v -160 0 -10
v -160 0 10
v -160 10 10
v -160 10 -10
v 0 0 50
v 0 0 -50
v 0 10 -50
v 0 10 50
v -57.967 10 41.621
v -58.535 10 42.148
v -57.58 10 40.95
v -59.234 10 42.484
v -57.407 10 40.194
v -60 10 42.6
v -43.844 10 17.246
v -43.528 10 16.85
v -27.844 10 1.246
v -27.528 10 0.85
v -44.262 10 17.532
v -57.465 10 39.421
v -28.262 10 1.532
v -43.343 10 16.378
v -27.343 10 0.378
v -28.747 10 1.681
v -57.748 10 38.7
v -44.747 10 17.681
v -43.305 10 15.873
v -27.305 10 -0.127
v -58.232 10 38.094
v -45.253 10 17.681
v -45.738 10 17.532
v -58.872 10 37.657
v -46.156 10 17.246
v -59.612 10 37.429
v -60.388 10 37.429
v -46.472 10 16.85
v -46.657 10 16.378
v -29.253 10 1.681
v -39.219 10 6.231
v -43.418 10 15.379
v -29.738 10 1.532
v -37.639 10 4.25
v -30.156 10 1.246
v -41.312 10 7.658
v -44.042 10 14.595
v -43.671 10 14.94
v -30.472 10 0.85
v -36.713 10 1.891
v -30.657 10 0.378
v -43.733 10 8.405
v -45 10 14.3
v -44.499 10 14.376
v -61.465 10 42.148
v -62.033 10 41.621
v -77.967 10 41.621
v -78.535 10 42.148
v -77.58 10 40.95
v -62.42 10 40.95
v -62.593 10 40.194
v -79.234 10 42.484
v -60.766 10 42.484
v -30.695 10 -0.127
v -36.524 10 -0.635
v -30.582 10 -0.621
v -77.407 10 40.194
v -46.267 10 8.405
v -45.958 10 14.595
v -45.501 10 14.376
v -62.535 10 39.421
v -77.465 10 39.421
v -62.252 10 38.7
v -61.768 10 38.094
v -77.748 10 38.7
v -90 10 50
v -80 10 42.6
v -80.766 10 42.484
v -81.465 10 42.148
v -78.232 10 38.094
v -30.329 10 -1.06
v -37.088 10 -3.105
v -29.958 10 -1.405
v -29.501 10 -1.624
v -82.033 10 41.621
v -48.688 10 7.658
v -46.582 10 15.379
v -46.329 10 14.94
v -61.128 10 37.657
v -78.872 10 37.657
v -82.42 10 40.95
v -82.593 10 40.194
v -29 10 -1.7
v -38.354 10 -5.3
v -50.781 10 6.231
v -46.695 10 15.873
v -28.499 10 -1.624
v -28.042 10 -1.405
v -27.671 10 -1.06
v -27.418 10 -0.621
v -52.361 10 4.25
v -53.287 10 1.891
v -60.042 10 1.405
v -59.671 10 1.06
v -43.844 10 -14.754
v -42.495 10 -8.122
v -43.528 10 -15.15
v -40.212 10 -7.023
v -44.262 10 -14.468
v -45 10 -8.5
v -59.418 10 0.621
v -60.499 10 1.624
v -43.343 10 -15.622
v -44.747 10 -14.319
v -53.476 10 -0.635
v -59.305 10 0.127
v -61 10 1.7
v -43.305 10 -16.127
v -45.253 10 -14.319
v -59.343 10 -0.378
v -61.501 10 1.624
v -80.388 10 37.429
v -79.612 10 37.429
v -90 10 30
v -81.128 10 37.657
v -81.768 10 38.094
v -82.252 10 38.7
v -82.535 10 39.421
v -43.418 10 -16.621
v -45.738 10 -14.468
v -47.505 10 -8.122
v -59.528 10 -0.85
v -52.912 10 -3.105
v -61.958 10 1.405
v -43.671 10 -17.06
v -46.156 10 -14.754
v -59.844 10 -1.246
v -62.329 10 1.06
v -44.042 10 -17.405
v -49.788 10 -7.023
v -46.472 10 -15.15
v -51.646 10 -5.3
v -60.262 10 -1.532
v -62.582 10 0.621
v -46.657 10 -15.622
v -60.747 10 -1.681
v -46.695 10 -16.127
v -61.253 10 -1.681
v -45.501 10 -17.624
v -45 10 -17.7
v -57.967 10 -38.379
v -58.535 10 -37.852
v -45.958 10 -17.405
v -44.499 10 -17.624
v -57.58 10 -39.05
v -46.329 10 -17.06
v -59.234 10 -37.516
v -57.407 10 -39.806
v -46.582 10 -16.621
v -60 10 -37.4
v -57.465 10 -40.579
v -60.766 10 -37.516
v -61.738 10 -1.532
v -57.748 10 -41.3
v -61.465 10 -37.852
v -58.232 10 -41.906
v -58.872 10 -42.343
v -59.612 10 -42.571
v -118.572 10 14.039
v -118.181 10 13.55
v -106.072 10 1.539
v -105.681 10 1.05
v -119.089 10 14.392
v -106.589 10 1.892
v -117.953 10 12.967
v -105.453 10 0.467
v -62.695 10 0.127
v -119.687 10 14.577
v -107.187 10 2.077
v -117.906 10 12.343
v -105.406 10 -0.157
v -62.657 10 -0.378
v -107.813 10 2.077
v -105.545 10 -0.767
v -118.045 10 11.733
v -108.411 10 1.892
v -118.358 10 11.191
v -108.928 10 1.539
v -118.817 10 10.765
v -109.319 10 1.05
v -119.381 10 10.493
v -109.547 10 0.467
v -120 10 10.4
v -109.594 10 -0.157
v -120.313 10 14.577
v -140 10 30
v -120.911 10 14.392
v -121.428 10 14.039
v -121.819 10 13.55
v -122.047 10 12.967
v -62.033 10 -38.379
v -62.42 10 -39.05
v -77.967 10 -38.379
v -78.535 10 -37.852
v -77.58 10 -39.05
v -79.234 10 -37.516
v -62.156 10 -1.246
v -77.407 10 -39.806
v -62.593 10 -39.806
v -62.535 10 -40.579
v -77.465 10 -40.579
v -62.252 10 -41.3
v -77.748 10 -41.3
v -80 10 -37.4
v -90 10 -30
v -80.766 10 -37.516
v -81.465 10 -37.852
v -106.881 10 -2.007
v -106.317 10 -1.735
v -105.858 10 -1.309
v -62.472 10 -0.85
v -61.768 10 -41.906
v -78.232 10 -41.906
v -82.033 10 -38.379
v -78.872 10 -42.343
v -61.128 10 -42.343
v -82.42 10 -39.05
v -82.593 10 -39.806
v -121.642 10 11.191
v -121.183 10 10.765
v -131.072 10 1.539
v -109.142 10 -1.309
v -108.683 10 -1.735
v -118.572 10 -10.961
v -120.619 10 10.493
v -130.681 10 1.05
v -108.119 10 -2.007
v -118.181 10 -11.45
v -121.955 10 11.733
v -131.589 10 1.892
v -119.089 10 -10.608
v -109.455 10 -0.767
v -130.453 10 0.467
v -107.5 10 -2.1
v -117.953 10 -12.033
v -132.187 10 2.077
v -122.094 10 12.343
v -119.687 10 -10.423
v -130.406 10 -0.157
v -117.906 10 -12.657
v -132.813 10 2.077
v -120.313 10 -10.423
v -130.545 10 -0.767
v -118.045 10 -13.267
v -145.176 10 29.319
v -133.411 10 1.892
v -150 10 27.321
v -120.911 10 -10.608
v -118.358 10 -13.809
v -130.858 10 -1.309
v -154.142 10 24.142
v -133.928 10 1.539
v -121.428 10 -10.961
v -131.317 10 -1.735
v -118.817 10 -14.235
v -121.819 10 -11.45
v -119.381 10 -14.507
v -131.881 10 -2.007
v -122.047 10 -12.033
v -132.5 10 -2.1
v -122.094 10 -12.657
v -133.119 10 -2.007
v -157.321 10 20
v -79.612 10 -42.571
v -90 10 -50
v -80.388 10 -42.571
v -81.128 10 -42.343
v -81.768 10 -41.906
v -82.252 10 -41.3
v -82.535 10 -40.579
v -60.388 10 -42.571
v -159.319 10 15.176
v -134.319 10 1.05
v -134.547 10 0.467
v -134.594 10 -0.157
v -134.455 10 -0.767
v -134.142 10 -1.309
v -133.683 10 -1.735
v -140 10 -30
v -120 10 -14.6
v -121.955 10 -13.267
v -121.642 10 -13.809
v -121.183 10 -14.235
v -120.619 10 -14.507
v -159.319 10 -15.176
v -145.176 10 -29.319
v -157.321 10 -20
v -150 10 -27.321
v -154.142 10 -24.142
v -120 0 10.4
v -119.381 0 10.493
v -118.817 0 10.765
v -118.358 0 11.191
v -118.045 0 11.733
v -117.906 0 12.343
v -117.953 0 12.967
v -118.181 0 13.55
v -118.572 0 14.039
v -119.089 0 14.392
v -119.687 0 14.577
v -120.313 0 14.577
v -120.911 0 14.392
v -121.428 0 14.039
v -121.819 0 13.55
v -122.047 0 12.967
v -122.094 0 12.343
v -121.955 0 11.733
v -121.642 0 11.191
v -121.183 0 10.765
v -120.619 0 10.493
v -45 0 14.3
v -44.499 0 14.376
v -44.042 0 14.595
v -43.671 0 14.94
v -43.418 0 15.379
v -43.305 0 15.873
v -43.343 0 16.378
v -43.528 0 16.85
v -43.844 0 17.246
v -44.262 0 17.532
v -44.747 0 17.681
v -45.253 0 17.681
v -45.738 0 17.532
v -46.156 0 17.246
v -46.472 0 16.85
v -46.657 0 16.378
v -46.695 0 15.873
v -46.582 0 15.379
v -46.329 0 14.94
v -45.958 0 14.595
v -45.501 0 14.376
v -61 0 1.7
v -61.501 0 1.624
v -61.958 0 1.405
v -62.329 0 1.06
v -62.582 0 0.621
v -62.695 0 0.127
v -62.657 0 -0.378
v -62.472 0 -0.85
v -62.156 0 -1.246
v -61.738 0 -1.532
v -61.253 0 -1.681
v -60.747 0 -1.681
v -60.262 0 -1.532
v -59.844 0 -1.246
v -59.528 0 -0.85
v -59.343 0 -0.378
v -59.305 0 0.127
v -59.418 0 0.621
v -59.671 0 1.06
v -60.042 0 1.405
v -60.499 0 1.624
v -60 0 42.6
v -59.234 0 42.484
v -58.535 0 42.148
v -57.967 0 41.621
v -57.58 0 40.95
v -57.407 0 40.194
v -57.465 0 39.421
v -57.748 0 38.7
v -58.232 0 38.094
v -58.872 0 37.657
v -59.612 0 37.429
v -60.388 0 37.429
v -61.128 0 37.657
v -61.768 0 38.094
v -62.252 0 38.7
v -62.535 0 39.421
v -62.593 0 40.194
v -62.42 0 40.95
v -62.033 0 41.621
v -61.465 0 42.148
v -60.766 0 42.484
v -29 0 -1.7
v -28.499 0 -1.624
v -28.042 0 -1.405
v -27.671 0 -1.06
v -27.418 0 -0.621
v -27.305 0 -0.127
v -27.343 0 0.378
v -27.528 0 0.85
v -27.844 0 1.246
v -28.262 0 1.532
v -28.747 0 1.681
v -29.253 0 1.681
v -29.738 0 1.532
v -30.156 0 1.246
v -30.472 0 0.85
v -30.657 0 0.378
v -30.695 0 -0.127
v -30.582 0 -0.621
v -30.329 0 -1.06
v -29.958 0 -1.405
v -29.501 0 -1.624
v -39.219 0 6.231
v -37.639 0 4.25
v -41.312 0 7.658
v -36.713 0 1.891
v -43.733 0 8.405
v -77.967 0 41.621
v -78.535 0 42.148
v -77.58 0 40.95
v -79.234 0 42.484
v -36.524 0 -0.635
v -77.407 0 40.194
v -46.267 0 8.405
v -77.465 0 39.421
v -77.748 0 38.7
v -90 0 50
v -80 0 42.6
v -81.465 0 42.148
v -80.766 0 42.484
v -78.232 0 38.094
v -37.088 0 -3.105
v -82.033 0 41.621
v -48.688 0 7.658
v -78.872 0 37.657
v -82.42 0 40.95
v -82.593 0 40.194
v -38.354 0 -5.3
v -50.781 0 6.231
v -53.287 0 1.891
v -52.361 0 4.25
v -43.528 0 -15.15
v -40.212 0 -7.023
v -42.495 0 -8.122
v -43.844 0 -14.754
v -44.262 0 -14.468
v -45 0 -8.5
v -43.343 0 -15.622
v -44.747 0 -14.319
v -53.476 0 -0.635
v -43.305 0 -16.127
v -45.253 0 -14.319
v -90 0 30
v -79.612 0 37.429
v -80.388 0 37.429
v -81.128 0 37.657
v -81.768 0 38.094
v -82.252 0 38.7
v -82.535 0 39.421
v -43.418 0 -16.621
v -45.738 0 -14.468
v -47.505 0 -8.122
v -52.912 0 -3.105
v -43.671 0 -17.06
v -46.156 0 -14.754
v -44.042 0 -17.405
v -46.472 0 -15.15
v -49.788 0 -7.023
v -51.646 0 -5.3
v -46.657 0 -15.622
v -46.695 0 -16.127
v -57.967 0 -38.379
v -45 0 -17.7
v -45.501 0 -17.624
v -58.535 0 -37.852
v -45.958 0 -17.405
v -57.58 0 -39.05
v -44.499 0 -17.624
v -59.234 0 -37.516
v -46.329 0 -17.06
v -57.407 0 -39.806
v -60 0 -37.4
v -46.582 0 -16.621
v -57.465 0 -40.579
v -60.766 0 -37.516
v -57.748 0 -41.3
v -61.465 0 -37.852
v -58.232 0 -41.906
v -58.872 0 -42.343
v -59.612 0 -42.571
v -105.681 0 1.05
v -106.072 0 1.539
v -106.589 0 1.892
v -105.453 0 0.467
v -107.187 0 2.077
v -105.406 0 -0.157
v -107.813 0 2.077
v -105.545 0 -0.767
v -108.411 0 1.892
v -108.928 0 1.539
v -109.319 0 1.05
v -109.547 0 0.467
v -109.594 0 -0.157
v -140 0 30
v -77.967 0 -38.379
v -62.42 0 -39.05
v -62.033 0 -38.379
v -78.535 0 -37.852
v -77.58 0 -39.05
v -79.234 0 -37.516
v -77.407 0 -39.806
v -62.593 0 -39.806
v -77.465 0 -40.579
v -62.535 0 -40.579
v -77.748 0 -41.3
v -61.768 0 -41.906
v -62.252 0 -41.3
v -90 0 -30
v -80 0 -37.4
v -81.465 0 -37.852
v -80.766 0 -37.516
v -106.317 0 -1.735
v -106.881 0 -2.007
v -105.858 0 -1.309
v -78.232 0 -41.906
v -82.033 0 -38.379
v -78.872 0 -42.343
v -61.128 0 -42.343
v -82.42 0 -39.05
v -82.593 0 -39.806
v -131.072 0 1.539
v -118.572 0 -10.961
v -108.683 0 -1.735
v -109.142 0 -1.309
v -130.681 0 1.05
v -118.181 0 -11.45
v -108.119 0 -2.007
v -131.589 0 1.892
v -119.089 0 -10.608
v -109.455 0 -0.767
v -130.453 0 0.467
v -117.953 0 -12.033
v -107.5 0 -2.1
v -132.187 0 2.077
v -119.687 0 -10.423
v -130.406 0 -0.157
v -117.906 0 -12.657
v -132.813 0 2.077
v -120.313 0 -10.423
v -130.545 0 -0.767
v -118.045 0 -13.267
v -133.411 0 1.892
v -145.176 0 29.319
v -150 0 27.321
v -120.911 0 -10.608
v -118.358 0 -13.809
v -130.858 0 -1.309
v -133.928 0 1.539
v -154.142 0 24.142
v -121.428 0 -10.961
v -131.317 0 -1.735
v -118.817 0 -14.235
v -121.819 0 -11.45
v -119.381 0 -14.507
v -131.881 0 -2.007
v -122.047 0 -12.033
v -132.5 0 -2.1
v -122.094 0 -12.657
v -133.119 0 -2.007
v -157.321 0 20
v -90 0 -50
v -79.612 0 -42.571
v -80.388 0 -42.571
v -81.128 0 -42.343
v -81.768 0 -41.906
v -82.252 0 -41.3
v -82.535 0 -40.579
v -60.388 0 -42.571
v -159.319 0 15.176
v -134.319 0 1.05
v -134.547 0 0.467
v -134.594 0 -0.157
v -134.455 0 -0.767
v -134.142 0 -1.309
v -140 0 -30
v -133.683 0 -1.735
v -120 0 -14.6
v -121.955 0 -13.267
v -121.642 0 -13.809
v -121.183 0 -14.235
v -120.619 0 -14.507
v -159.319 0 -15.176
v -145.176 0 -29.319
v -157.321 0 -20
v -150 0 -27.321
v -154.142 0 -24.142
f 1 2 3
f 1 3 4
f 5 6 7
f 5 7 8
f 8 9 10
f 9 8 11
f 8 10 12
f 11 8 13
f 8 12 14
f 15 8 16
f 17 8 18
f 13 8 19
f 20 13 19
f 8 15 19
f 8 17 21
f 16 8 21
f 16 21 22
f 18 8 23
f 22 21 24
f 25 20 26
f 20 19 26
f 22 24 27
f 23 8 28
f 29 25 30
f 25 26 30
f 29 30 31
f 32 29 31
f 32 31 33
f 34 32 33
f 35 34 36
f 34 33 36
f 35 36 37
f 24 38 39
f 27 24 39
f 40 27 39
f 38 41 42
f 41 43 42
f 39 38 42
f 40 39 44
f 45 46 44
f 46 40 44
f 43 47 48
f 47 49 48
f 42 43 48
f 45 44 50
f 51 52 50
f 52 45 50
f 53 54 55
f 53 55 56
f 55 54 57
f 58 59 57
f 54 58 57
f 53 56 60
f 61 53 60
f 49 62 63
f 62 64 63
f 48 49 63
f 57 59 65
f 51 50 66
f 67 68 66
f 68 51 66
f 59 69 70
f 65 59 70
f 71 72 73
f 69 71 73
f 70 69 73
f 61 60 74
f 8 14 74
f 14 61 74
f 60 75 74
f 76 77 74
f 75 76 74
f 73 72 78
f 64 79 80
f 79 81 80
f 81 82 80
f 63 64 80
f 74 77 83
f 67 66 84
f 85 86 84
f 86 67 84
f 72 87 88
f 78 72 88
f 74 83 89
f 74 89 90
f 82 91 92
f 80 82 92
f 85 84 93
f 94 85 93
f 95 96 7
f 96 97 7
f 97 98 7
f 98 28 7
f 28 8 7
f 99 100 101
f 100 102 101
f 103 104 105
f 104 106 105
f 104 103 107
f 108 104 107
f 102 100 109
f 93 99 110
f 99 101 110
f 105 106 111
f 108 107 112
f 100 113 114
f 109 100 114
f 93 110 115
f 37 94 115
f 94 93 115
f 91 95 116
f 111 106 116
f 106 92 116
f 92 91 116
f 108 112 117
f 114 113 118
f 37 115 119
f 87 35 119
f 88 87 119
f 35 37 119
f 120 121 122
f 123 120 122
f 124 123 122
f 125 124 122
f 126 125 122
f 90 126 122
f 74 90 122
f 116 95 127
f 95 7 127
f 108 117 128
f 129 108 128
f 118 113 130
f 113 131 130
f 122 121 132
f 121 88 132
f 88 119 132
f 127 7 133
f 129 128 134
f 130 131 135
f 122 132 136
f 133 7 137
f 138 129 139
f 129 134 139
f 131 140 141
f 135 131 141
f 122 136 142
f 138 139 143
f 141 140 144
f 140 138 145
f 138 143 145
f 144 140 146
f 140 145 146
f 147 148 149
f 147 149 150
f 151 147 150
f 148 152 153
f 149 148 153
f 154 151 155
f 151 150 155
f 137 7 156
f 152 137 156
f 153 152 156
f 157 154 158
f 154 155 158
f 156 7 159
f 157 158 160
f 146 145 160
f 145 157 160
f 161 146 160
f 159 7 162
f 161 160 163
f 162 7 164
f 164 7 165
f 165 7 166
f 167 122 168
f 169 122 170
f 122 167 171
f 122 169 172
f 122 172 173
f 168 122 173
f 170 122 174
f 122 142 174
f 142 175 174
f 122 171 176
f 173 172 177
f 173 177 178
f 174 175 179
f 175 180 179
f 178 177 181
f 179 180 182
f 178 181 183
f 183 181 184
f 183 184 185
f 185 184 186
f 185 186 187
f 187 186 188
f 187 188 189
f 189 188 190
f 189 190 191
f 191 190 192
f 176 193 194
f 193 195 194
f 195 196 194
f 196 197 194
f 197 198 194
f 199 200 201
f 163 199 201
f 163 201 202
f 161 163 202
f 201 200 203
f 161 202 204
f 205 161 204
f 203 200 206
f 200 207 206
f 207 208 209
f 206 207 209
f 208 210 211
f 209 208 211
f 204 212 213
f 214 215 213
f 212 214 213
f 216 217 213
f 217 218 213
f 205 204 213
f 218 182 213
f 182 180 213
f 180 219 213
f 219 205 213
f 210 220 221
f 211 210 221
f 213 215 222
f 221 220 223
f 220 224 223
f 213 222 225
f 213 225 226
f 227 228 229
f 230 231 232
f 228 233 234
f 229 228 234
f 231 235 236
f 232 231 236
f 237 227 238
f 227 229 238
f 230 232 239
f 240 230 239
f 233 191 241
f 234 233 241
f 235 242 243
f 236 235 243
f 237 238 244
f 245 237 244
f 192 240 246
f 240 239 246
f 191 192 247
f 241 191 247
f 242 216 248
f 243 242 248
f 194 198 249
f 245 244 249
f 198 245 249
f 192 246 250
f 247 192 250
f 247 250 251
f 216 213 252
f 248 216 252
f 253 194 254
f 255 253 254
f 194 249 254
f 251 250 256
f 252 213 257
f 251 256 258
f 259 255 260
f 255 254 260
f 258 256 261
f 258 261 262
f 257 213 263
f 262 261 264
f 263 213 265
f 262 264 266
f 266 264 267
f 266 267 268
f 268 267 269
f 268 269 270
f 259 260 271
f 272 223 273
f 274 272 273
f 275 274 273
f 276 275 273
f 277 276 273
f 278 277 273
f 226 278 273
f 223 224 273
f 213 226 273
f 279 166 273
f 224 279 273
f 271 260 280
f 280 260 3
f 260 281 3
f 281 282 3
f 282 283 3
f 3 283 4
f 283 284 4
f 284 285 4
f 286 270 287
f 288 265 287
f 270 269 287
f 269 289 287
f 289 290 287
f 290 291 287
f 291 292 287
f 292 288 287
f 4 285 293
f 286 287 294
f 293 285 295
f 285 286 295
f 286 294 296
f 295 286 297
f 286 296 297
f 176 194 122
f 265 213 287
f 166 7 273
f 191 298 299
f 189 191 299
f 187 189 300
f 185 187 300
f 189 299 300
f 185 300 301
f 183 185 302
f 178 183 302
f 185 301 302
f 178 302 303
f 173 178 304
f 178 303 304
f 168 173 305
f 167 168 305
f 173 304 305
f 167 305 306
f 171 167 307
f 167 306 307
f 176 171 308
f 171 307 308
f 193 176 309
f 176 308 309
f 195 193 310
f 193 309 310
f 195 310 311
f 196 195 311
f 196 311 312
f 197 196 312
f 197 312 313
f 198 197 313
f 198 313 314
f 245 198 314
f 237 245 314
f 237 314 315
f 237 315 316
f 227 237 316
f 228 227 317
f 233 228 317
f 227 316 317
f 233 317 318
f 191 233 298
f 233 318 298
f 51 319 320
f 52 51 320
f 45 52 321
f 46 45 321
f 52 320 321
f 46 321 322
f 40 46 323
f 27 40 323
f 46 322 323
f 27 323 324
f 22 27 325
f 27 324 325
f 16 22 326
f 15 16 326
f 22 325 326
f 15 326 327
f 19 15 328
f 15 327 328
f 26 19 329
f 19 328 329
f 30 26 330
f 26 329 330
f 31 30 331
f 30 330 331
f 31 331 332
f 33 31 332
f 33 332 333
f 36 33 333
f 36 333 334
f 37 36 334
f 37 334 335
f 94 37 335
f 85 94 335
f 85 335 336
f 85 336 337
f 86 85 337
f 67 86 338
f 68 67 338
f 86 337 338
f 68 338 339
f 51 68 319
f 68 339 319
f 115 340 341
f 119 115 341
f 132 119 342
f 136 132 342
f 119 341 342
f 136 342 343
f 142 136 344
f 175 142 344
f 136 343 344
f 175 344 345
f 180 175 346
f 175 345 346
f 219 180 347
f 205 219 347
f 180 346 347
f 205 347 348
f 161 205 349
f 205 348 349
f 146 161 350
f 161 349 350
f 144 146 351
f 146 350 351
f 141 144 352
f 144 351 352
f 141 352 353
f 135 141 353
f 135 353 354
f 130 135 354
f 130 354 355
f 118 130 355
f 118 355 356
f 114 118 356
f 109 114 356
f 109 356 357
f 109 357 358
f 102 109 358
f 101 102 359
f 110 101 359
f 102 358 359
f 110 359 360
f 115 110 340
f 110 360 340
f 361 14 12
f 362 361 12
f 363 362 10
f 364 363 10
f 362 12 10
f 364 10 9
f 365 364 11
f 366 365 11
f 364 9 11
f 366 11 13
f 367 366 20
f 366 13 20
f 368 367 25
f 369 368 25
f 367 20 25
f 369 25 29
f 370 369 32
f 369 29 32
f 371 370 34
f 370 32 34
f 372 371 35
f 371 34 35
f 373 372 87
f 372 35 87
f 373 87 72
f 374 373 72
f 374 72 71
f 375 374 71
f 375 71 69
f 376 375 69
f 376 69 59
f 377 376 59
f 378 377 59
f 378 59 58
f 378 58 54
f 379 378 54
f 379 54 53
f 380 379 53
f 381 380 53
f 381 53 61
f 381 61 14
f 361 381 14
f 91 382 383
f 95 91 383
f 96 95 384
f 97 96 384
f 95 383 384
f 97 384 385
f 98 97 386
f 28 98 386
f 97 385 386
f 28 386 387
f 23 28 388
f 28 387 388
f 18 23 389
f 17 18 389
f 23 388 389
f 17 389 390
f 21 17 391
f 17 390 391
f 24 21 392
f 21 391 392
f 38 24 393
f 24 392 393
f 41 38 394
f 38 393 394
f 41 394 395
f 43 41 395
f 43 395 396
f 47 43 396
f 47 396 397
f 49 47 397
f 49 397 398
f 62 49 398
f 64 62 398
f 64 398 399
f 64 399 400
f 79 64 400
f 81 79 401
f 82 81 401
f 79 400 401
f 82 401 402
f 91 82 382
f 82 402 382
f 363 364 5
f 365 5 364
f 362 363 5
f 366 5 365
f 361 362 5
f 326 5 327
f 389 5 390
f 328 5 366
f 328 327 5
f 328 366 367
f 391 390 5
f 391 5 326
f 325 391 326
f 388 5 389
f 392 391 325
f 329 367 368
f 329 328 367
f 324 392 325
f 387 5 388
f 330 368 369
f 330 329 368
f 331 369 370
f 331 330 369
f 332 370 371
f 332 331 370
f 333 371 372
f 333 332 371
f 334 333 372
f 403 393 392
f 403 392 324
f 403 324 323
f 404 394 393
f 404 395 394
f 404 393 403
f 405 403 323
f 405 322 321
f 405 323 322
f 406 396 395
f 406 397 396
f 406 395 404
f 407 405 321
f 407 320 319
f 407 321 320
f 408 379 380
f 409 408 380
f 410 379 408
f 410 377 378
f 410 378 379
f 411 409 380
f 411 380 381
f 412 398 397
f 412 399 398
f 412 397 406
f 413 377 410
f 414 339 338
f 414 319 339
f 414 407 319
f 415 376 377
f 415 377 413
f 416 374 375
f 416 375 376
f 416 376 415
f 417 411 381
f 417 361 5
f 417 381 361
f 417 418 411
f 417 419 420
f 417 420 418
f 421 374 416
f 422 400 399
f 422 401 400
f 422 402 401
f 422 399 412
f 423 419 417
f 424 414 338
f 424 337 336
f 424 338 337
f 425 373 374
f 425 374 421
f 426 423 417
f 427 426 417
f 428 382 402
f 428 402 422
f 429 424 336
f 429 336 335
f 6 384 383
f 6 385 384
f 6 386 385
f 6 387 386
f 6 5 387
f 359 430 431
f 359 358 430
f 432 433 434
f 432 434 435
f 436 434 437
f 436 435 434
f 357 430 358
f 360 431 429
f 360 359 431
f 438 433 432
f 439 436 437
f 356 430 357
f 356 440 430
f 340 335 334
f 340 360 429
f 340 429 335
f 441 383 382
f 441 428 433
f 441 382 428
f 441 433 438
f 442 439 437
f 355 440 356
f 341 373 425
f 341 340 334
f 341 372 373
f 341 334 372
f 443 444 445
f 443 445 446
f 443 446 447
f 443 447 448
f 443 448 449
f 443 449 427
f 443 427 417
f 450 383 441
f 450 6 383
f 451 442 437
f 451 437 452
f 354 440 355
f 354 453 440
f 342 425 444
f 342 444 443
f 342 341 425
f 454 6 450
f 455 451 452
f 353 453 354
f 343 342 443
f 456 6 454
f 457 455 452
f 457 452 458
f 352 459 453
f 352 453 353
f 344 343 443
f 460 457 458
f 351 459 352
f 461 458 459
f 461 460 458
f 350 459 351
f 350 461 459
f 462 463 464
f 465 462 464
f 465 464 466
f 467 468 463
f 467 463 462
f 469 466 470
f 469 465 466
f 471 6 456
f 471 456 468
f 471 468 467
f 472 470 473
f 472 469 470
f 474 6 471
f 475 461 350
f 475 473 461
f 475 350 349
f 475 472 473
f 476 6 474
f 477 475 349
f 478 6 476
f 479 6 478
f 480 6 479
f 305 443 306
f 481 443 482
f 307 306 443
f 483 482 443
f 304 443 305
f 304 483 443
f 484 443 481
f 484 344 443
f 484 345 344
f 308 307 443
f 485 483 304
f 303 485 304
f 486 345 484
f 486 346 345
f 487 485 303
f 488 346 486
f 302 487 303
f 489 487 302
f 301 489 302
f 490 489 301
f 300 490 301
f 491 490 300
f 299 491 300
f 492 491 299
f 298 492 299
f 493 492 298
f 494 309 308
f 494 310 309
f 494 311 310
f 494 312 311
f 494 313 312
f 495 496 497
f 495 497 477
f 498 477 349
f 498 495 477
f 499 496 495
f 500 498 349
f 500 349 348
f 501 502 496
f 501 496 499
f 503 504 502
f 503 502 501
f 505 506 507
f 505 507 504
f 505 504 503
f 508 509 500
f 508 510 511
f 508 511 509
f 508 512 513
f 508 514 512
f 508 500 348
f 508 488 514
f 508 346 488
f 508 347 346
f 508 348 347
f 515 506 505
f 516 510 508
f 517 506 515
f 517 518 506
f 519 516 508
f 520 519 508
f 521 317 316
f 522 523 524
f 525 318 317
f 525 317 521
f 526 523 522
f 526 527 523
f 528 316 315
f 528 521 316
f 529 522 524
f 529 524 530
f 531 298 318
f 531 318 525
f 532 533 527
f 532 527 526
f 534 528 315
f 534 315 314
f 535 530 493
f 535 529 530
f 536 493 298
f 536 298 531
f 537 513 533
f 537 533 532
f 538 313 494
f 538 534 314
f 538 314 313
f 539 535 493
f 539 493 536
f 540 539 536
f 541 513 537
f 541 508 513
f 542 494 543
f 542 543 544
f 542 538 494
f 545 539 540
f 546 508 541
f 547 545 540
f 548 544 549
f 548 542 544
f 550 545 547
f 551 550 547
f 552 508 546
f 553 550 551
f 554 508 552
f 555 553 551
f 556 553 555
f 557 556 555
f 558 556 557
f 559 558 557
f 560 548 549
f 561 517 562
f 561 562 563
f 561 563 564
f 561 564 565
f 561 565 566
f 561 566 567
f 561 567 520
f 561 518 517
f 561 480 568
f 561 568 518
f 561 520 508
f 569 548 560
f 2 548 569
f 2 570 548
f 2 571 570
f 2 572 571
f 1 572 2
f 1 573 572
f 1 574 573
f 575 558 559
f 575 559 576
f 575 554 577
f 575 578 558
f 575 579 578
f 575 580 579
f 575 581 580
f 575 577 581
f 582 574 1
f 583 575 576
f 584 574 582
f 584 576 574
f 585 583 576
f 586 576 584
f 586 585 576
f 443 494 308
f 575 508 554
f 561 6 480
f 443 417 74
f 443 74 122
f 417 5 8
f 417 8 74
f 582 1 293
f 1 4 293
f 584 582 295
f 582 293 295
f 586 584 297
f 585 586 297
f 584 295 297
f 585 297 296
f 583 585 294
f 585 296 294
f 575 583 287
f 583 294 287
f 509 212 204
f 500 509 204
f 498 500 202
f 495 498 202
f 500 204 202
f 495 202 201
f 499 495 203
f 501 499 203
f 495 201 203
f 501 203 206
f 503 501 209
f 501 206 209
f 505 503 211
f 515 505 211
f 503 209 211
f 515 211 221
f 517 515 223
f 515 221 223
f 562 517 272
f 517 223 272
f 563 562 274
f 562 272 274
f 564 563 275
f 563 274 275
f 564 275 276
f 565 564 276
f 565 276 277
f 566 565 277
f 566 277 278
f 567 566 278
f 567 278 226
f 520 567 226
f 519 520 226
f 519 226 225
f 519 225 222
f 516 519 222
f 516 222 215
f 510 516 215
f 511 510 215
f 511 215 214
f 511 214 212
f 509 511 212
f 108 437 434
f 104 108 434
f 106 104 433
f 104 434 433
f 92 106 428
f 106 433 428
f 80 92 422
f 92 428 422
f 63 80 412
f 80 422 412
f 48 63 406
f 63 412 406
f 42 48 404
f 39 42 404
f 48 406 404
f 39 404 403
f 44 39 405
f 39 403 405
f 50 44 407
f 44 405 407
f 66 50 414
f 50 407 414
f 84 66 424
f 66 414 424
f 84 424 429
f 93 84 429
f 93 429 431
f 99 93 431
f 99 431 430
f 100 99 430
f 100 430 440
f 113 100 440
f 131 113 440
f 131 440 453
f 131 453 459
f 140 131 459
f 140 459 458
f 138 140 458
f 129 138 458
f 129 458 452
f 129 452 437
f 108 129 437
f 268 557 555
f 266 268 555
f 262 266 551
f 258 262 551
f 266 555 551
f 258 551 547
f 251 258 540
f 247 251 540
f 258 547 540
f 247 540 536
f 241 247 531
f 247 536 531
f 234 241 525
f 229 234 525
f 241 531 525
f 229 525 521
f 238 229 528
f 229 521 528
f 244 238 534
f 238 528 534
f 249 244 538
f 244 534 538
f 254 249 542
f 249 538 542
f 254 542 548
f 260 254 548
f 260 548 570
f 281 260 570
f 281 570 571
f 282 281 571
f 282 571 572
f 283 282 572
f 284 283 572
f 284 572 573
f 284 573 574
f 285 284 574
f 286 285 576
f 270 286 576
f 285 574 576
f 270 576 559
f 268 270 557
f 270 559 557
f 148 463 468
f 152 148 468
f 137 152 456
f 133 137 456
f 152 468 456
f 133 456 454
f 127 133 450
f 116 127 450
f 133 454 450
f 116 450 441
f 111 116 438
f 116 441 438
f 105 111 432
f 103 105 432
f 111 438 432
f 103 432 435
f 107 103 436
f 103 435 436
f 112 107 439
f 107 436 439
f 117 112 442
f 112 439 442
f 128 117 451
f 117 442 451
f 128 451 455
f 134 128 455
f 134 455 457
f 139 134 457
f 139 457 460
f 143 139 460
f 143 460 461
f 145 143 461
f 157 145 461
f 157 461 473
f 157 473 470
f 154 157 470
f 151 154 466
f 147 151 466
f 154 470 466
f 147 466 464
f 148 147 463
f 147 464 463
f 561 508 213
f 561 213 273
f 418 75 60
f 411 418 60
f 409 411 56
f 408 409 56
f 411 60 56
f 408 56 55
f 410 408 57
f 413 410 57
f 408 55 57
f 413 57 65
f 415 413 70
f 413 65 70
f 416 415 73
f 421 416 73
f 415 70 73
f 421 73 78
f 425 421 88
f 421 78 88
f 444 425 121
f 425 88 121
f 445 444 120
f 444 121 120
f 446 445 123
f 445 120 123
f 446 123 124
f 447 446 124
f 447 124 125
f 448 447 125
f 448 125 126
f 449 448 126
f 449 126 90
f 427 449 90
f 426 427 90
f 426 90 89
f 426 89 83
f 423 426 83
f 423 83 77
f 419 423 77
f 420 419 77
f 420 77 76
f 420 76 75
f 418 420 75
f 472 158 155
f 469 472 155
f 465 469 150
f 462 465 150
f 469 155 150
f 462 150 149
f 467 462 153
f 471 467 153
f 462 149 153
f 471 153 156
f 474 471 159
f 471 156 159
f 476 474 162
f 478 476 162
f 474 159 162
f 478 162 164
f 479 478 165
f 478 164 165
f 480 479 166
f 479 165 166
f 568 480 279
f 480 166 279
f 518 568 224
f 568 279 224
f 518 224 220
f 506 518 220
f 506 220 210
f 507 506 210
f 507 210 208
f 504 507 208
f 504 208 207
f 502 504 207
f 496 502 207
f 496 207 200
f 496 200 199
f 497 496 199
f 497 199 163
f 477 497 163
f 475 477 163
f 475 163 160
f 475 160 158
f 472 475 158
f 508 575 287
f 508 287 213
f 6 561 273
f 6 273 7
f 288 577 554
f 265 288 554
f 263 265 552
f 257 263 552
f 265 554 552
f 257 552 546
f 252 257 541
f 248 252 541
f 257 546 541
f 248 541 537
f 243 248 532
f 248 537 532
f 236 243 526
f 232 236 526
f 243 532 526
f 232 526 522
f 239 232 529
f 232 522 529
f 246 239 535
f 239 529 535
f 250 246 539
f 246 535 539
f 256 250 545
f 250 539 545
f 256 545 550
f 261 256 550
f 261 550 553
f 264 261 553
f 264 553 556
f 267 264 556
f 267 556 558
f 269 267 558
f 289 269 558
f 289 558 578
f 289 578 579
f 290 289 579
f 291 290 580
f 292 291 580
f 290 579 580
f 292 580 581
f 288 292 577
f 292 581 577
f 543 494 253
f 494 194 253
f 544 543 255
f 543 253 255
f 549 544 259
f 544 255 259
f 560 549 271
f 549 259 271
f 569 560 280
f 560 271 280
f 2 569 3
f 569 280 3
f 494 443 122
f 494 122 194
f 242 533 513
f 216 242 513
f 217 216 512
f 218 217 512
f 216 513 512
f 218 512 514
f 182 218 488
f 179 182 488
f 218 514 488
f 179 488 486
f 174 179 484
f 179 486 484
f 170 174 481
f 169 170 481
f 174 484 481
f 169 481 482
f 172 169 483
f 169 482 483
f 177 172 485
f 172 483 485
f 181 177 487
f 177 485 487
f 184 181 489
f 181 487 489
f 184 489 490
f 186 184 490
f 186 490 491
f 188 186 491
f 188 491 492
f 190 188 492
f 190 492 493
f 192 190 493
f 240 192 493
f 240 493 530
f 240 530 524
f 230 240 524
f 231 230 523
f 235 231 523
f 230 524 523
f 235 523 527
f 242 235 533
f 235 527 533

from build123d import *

# Parameters (mm, degrees)
EXTRUDE_2_DEPTH      = 10
FILLET_2_R           = 20
SKETCH_4_R           = 2.6
CUT_EXTRUDE_2_DEPTH  = 168.928556237
SKETCH_5_R           = 8.5
CUT_EXTRUDE_3_DEPTH  = 168.928556237
SKETCH_17_R          = 1.7
CUT_EXTRUDE_11_DEPTH = 10
SKETCH_18_R          = 2.1
CUT_EXTRUDE_12_DEPTH = 10


with BuildPart() as part:
    # 草图2 → 凸台-拉伸2 (new body)
    with BuildSketch(Plane(origin=(0, 0, 0), x_dir=(1, 0, 0), z_dir=(0, 1, 0))):
        Polygon((0, 50), (0, -50), (-90, -50), (-90, -30), (-160, -30), (-160, 30), (-90, 30), (-90, 50), align=None)
    extrude(amount=EXTRUDE_2_DEPTH)

    # 圆角2
    fillet_2_edges = [part.edges().sort_by_distance(p)[0] for p in [
        (-160, 5, 30),
        (-160, 5, -30),
    ]]
    fillet(fillet_2_edges, radius=FILLET_2_R)

    # 草图4 → 切除-拉伸2 (cut, through all)
    with BuildSketch(Plane(origin=(0, 10, 0), x_dir=(1, 0, 0), z_dir=(0, 1, 0))):
        with Locations(Location((-60, -40, 0), (0, 0, 270))):
            Circle(SKETCH_4_R)
        with Locations(Location((-80, -40, 0), (0, 0, 270))):
            Circle(SKETCH_4_R)
        with Locations(Location((-80, 40, 0), (0, 0, 270))):
            Circle(SKETCH_4_R)
        with Locations(Location((-60, 40, 0), (0, 0, 270))):
            Circle(SKETCH_4_R)
    extrude(amount=-CUT_EXTRUDE_2_DEPTH, mode=Mode.SUBTRACT)

    # 草图5 → 切除-拉伸3 (cut, through all)
    with BuildSketch(Plane.XZ):
        with Locations(Location((-45, 0, 0), (0, 0, 270))):
            Circle(SKETCH_5_R)
    extrude(amount=-CUT_EXTRUDE_3_DEPTH, mode=Mode.SUBTRACT)

    # 草图17 → 切除-拉伸11 (cut)
    with BuildSketch(Plane.XZ):
        with Locations(Location((-45, 16, 0), (0, 0, 270))):
            Circle(SKETCH_17_R)
        with Locations(Location((-45, -16, 0), (0, 0, 270))):
            Circle(SKETCH_17_R)
        with Locations(Location((-29, 0, 0), (0, 0, 270))):
            Circle(SKETCH_17_R)
        with Locations(Location((-61, 0, 0), (0, 0, 90))):
            Circle(SKETCH_17_R)
    extrude(amount=-CUT_EXTRUDE_11_DEPTH, mode=Mode.SUBTRACT)

    # 草图18 → 切除-拉伸12 (cut)
    with BuildSketch(Plane.XZ):
        with Locations(Location((-120, 12.5, 0), (0, 0, 270))):
            Circle(SKETCH_18_R)
        with Locations(Location((-132.5, 0, 0), (0, 0, 270))):
            Circle(SKETCH_18_R)
        with Locations(Location((-120, -12.5, 0), (0, 0, 270))):
            Circle(SKETCH_18_R)
        with Locations(Location((-107.5, 0, 0), (0, 0, 270))):
            Circle(SKETCH_18_R)
    extrude(amount=-CUT_EXTRUDE_12_DEPTH, mode=Mode.SUBTRACT)


solid = part.part
